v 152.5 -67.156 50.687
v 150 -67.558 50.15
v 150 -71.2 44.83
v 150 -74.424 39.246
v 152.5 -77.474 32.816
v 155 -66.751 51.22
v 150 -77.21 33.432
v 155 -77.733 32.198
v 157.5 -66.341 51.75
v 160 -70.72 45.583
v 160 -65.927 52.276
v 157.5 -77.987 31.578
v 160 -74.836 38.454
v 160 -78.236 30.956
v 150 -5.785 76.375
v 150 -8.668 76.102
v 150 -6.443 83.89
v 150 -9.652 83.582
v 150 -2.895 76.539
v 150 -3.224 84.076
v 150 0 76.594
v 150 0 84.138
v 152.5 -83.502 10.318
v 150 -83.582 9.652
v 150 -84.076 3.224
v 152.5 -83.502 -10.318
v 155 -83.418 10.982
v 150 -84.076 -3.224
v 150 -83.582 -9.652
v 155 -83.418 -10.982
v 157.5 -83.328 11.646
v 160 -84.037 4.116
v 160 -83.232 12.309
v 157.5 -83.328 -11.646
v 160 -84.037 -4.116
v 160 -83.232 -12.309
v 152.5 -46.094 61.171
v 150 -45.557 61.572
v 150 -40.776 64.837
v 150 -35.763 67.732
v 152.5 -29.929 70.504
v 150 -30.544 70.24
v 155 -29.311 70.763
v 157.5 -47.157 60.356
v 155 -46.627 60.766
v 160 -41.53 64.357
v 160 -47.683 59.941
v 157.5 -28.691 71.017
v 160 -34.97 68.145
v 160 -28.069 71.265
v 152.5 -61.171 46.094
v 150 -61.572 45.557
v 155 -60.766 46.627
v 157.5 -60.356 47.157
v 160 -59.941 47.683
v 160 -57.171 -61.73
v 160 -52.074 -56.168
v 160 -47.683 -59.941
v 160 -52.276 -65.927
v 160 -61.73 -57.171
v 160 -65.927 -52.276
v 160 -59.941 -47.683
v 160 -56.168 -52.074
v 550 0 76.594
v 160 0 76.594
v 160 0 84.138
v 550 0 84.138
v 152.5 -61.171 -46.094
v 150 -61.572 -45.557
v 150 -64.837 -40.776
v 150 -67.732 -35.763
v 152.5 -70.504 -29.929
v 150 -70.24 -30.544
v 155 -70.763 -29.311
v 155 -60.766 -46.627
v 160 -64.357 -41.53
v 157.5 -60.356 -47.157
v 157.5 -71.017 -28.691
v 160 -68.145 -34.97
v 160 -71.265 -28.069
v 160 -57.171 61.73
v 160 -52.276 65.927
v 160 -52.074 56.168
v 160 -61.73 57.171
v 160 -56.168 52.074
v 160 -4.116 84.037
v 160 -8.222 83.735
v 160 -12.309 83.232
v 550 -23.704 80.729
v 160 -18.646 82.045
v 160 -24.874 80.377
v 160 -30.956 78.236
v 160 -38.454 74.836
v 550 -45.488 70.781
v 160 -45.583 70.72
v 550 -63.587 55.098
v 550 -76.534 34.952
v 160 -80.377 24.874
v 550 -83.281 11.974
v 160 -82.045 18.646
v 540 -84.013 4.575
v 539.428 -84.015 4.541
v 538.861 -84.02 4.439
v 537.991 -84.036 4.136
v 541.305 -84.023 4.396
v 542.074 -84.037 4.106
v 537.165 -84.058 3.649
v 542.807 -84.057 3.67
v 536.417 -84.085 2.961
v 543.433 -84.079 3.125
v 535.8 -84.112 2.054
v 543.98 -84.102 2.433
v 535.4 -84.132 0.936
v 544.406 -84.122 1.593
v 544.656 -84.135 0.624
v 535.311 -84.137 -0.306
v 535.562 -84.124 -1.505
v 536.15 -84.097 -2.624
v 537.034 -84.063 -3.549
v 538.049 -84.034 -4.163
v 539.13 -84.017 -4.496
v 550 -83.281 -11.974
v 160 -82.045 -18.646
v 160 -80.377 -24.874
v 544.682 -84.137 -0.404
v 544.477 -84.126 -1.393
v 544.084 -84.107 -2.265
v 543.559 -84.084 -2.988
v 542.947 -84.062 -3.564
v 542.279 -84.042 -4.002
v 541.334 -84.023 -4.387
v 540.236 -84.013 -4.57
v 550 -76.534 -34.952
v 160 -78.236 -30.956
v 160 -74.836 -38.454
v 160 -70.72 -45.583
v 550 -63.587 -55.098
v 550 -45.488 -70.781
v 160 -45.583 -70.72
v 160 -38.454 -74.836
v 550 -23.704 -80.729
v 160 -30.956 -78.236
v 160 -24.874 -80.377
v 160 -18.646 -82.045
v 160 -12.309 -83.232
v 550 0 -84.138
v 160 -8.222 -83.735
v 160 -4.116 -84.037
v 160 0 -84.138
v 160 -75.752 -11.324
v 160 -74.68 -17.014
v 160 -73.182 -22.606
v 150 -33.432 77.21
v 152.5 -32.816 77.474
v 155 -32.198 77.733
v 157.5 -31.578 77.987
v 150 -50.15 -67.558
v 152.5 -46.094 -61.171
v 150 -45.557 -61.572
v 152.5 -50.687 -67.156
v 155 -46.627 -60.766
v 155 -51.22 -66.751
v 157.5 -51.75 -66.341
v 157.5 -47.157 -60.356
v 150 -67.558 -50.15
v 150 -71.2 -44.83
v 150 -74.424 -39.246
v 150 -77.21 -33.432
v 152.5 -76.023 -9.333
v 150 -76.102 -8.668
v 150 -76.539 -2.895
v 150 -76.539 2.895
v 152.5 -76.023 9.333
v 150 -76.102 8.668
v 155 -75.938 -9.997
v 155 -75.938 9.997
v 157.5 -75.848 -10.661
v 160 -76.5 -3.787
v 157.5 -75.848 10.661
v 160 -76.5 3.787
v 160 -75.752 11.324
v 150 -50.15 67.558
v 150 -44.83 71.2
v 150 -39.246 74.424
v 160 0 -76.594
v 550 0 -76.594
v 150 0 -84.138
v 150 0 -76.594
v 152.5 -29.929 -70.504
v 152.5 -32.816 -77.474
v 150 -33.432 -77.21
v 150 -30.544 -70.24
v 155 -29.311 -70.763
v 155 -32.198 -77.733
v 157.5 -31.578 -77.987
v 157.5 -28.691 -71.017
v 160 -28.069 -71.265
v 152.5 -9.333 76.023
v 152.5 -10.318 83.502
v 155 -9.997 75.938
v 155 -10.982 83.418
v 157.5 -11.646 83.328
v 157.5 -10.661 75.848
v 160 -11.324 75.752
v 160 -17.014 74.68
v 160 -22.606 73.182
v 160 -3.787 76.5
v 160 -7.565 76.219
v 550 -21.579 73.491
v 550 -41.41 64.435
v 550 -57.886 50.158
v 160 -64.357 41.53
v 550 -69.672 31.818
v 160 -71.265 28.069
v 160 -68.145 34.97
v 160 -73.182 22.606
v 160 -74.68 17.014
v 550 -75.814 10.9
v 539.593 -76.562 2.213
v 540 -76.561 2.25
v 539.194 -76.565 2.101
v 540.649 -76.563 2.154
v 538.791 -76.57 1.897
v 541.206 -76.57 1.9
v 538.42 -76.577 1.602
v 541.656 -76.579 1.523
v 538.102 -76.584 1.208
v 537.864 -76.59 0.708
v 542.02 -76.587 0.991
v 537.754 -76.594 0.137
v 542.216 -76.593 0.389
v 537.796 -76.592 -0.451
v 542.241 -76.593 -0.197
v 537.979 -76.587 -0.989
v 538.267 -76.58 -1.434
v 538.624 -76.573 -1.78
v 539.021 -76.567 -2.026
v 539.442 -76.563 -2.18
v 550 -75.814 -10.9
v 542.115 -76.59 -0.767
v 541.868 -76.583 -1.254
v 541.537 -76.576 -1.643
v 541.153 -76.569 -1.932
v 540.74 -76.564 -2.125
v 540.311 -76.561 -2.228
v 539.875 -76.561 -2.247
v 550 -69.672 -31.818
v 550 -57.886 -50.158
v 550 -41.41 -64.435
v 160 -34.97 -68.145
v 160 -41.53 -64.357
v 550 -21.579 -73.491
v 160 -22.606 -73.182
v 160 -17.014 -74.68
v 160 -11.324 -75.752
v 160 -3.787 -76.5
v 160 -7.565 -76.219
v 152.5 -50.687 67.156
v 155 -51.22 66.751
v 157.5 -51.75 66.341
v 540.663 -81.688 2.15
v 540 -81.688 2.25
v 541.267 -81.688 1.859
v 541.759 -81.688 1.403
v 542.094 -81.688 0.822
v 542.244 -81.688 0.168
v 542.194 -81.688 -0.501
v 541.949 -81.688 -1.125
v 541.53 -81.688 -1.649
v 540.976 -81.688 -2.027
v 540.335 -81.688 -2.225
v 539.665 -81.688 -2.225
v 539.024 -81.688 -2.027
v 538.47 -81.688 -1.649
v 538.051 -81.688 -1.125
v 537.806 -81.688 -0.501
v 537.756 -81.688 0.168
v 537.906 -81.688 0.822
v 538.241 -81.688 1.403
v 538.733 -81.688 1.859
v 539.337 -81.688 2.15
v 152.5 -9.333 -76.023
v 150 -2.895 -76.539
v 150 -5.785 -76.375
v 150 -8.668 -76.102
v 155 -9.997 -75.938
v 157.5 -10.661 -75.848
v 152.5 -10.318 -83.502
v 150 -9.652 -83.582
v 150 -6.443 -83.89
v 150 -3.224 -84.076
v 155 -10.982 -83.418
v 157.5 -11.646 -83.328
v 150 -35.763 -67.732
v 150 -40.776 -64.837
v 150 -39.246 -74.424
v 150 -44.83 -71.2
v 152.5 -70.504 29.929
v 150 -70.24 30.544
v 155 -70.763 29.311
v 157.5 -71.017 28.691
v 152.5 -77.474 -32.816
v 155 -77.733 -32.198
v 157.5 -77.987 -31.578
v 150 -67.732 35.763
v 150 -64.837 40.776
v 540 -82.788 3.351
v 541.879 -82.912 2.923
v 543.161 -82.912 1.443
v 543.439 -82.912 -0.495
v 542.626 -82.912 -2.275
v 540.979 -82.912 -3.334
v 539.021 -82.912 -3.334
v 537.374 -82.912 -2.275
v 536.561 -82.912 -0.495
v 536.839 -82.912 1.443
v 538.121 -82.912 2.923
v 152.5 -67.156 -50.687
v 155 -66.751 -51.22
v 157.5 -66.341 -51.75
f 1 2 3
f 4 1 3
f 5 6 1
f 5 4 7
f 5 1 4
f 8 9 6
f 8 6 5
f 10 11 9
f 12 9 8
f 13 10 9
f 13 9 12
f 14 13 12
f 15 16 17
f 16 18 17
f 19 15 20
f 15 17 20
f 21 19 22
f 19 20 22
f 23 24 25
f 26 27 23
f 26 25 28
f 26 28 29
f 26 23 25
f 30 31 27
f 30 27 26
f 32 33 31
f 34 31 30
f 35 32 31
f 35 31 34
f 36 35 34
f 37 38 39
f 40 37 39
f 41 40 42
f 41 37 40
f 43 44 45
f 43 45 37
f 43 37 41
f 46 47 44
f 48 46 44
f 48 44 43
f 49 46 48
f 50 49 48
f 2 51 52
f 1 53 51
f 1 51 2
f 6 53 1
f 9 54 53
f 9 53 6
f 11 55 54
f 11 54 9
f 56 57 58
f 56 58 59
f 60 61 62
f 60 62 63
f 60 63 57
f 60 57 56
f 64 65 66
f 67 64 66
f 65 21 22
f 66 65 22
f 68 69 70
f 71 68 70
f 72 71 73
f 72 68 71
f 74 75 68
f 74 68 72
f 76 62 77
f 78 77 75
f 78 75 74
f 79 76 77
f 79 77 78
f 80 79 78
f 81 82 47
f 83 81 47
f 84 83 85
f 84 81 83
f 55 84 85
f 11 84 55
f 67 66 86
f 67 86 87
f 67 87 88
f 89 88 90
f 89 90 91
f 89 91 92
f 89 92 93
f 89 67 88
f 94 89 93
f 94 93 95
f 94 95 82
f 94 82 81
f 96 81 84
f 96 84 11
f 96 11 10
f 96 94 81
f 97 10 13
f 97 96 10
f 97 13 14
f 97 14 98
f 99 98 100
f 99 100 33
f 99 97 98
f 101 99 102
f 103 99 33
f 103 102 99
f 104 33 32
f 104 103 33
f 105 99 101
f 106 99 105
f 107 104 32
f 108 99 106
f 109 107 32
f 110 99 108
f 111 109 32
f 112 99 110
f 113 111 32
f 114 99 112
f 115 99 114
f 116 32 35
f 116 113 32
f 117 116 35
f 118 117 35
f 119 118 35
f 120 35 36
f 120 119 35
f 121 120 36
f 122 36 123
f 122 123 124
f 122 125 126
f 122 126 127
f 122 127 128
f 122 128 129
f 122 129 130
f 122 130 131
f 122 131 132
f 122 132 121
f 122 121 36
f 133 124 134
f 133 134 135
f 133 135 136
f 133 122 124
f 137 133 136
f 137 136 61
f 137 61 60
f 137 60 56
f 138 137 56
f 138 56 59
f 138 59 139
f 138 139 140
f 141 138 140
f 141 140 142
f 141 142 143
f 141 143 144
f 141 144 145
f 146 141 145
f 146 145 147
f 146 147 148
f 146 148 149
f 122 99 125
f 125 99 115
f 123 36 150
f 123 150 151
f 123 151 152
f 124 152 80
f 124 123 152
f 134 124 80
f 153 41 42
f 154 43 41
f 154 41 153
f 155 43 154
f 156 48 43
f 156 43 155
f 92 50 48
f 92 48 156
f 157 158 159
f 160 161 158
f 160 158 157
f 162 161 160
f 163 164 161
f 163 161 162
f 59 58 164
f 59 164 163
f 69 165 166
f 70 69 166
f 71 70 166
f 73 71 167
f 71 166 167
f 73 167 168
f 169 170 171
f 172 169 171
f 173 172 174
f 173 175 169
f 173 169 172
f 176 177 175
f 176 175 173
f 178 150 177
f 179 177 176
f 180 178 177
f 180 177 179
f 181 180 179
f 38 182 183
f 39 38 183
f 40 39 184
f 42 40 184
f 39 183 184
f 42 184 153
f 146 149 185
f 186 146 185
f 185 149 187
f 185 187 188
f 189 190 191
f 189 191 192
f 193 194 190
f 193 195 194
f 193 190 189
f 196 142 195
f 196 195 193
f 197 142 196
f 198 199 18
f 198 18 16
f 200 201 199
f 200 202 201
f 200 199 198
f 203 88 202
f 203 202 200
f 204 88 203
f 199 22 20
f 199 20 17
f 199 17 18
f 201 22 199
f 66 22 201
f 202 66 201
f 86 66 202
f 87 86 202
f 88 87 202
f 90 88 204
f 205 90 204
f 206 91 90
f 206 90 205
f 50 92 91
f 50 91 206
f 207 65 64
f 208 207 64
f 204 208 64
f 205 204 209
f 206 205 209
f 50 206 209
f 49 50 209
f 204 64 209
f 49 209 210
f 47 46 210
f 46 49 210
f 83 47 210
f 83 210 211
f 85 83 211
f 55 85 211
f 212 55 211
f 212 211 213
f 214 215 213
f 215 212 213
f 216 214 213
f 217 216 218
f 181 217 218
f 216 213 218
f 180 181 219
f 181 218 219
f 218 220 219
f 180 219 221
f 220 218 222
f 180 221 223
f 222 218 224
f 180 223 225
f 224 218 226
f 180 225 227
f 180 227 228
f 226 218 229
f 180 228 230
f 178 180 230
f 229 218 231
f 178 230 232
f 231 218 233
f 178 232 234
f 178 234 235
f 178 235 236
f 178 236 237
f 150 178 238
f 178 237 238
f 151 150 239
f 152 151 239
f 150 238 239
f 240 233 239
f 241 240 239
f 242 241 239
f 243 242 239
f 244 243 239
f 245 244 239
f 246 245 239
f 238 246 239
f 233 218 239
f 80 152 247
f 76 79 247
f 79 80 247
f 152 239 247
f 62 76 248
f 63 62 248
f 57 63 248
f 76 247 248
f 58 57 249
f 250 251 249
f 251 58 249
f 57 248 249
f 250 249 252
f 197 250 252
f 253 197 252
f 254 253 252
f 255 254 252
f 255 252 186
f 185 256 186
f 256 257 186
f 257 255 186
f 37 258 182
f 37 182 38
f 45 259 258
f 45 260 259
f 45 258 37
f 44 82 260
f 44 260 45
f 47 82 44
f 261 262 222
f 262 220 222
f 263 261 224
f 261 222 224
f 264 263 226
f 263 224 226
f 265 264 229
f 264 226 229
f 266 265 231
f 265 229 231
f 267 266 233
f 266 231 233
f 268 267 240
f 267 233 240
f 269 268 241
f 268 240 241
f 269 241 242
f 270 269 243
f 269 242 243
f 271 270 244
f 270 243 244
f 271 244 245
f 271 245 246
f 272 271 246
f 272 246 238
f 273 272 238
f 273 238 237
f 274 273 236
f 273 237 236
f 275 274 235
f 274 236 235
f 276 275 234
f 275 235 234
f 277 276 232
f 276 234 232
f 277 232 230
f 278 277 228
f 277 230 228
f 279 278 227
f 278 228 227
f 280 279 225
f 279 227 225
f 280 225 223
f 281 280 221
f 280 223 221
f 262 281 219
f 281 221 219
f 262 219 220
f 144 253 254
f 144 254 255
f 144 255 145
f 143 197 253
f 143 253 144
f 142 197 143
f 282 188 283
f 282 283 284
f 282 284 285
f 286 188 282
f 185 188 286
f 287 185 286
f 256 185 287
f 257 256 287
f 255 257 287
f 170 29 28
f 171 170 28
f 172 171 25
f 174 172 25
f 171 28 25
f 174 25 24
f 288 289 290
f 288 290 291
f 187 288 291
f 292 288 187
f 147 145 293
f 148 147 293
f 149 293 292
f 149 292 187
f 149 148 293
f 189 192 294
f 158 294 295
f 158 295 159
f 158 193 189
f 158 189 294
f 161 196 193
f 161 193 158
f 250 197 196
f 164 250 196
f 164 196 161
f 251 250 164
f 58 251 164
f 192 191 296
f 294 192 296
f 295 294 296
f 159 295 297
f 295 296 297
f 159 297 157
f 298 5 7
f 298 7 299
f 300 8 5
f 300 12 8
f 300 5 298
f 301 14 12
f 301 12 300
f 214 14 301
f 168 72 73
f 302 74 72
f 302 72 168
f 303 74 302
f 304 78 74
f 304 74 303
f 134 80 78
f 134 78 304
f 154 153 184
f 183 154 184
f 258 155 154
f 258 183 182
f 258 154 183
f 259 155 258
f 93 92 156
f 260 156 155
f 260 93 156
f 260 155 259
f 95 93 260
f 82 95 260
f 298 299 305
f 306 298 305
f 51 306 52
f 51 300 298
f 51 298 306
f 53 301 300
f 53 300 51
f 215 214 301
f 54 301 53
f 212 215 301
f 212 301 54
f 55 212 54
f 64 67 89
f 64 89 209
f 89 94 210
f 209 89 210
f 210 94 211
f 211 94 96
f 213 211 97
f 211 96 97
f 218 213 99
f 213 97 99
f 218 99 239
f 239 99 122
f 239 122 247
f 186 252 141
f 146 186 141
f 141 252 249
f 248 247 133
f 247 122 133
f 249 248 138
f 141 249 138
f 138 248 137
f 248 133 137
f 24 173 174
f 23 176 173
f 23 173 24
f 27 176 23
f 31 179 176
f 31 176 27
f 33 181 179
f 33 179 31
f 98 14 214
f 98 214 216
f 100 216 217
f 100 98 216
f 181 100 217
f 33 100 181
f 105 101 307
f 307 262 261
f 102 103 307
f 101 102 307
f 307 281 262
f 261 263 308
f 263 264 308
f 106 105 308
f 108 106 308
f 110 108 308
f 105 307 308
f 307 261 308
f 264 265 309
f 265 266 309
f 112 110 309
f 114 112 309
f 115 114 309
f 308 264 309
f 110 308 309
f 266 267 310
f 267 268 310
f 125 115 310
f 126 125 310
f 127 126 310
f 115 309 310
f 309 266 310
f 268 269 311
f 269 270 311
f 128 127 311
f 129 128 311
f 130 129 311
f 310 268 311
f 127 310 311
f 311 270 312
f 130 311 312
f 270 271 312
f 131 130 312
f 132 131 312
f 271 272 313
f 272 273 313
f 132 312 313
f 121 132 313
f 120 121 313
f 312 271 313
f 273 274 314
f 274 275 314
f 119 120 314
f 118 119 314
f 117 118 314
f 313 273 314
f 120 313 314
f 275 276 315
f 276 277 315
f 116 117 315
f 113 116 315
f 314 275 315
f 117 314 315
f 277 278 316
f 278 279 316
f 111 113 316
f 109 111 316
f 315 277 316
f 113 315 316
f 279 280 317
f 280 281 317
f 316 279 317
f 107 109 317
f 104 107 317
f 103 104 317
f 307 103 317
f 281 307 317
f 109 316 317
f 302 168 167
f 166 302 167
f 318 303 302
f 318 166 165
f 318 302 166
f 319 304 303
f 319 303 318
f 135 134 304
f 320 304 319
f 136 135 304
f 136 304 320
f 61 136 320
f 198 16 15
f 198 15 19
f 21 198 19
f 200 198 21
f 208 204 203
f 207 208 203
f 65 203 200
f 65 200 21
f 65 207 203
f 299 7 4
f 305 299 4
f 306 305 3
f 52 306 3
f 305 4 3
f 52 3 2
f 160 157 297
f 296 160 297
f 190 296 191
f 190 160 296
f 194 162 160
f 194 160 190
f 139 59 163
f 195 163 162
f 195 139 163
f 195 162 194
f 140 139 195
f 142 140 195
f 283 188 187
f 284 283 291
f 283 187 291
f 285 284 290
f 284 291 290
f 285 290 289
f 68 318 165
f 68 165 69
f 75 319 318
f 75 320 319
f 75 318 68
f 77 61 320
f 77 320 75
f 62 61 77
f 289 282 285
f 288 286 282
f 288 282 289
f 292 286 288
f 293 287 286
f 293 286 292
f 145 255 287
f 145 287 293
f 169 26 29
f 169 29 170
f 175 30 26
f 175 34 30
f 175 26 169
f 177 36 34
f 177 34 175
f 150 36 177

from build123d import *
from build123d.topology import SkipClean

# Parameters (mm, degrees)
SKETCH1_W                                           = 390
SKETCH1_H                                           = 7.5438
BOSS_EXTRUDE1_DEPTH                                 = 5
DRAFT1_ANGLE                                        = -15
CIRPATTERN1_COUNT                                   = 12
DRAFT1_OF_CIRPATTERN1_2_ANGLE                       = -15
DRAFT1_OF_CIRPATTERN1_3_ANGLE                       = -15
DRAFT1_OF_CIRPATTERN1_4_ANGLE                       = -15
DRAFT1_OF_CIRPATTERN1_5_ANGLE                       = -15
DRAFT1_OF_CIRPATTERN1_6_ANGLE                       = -15
DRAFT1_OF_CIRPATTERN1_7_ANGLE                       = -15
DRAFT1_OF_CIRPATTERN1_8_ANGLE                       = -15
DRAFT1_OF_CIRPATTERN1_9_ANGLE                       = -15
DRAFT1_OF_CIRPATTERN1_10_ANGLE                      = -15
DRAFT1_OF_CIRPATTERN1_11_ANGLE                      = -15
DRAFT1_OF_CIRPATTERN1_12_ANGLE                      = -15
CUT_EXTRUDE1_DEPTH                                  = 563.723944588
CSK_FOR_M4_COUNTERSUNK_FLAT_HEAD_SCREW1_D           = 4.5
CSK_FOR_M4_COUNTERSUNK_FLAT_HEAD_SCREW1_CSINK_D     = 9.4
CSK_FOR_M4_COUNTERSUNK_FLAT_HEAD_SCREW1_CSINK_ANGLE = 90


with BuildPart() as part:
    # Sketch1 → Revolve1 (revolve)
    with BuildSketch(Plane.XY, mode=Mode.PRIVATE) as revolve1_sk:
        with Locations((355, 80.3656)):
            Rectangle(SKETCH1_W, SKETCH1_H)
    revolve(revolve1_sk.sketch.rotate(Axis((0, 0, 0), (1, 0, 0)), 90), axis=Axis((0, 0, 0), (1, 0, 0)))

    # Sketch2 → Boss-Extrude1 (add, symmetric)
    with BuildSketch(Plane(origin=(155, 0, 0), x_dir=(0, 0, -1), z_dir=(1, 0, 0))):
        with BuildLine():
            Line((9.997484009, 75.938430279), (10.982147498, 83.417692024))
            ThreePointArc((10.982147498, 83.417692024), (0, 84.1375), (-10.982147498, 83.417692024))
            Line((-10.982147498, 83.417692024), (-9.997484009, 75.938430279))
            ThreePointArc((-9.997484009, 75.938430279), (0, 76.5937), (9.997484009, 75.938430279))
        make_face()
    boss_extrude1 = extrude(amount=BOSS_EXTRUDE1_DEPTH, both=True)

    # Draft1
    draft1_faces = [part.faces().sort_by_distance(p)[0] for p in [
        (155, 79.678061151, 10.489815753),
        (155, 79.678061151, -10.489815753),
    ]]
    draft(draft1_faces, Plane(origin=(155, 0, 0), x_dir=(0, 0, 1), z_dir=(1, 0, 0)), DRAFT1_ANGLE)

    # CirPattern1: Boss-Extrude1 ×12 about axis
    with SkipClean():  # the faces are left unmerged after this step: merging them gives an invalid solid
        cirpattern1_axis = Axis((0, 0, 0), (1, 0, 0))
        for i in range(1, CIRPATTERN1_COUNT):
            add(boss_extrude1.rotate(cirpattern1_axis, i * 360 / CIRPATTERN1_COUNT))

    # Draft1 of CirPattern1 2
    draft1_of_cirpattern1_2_faces = [part.faces().sort_by_distance(p)[0] for p in [
        (155, 63.758317205, 48.923477499),
        (155, 74.248132958, 30.754583652),
    ]]
    draft(draft1_of_cirpattern1_2_faces, Plane(origin=(155, 0, 0), x_dir=(0, -0.49999999999999994, 0.8660254037844387), z_dir=(1, 0, 0)), DRAFT1_OF_CIRPATTERN1_2_ANGLE)

    # Draft1 of CirPattern1 3
    draft1_of_cirpattern1_3_faces = [part.faces().sort_by_distance(p)[0] for p in [
        (155, 30.754583652, 74.248132958),
        (155, 48.923477499, 63.758317205),
    ]]
    draft(draft1_of_cirpattern1_3_faces, Plane(origin=(155, 0, 0), x_dir=(0, -0.8660254037844386, 0.5000000000000001), z_dir=(1, 0, 0)), DRAFT1_OF_CIRPATTERN1_3_ANGLE)

    # Draft1 of CirPattern1 4
    draft1_of_cirpattern1_4_faces = [part.faces().sort_by_distance(p)[0] for p in [
        (155, -10.489815753, 79.678061151),
        (155, 10.489815753, 79.678061151),
    ]]
    draft(draft1_of_cirpattern1_4_faces, Plane(origin=(155, 0, 0), x_dir=(0, -1, 0), z_dir=(1, 0, 0)), DRAFT1_OF_CIRPATTERN1_4_ANGLE)

    # Draft1 of CirPattern1 5
    draft1_of_cirpattern1_5_faces = [part.faces().sort_by_distance(p)[0] for p in [
        (155, -48.923477499, 63.758317205),
        (155, -30.754583652, 74.248132958),
    ]]
    draft(draft1_of_cirpattern1_5_faces, Plane(origin=(155, 0, 0), x_dir=(0, -0.8660254037844387, -0.4999999999999998), z_dir=(1, 0, 0)), DRAFT1_OF_CIRPATTERN1_5_ANGLE)

    # Draft1 of CirPattern1 6
    draft1_of_cirpattern1_6_faces = [part.faces().sort_by_distance(p)[0] for p in [
        (155, -74.248132958, 30.754583652),
        (155, -63.758317205, 48.923477499),
    ]]
    draft(draft1_of_cirpattern1_6_faces, Plane(origin=(155, 0, 0), x_dir=(0, -0.49999999999999994, -0.8660254037844387), z_dir=(1, 0, 0)), DRAFT1_OF_CIRPATTERN1_6_ANGLE)

    # Draft1 of CirPattern1 7
    draft1_of_cirpattern1_7_faces = [part.faces().sort_by_distance(p)[0] for p in [
        (155, -79.678061151, -10.489815753),
        (155, -79.678061151, 10.489815753),
    ]]
    draft(draft1_of_cirpattern1_7_faces, Plane(origin=(155, 0, 0), x_dir=(0, 0, -1), z_dir=(1, 0, 0)), DRAFT1_OF_CIRPATTERN1_7_ANGLE)

    # Draft1 of CirPattern1 8
    draft1_of_cirpattern1_8_faces = [part.faces().sort_by_distance(p)[0] for p in [
        (155, -63.758317205, -48.923477499),
        (155, -74.248132958, -30.754583652),
    ]]
    draft(draft1_of_cirpattern1_8_faces, Plane(origin=(155, 0, 0), x_dir=(0, 0.5000000000000001, -0.8660254037844386), z_dir=(1, 0, 0)), DRAFT1_OF_CIRPATTERN1_8_ANGLE)

    # Draft1 of CirPattern1 9
    draft1_of_cirpattern1_9_faces = [part.faces().sort_by_distance(p)[0] for p in [
        (155, -30.754583652, -74.248132958),
        (155, -48.923477499, -63.758317205),
    ]]
    draft(draft1_of_cirpattern1_9_faces, Plane(origin=(155, 0, 0), x_dir=(0, 0.8660254037844384, -0.5000000000000004), z_dir=(1, 0, 0)), DRAFT1_OF_CIRPATTERN1_9_ANGLE)

    # Draft1 of CirPattern1 10
    draft1_of_cirpattern1_10_faces = [part.faces().sort_by_distance(p)[0] for p in [
        (155, 10.489815753, -79.678061151),
        (155, -10.489815753, -79.678061151),
    ]]
    draft(draft1_of_cirpattern1_10_faces, Plane.YZ.offset(155), DRAFT1_OF_CIRPATTERN1_10_ANGLE)

    # Draft1 of CirPattern1 11
    draft1_of_cirpattern1_11_faces = [part.faces().sort_by_distance(p)[0] for p in [
        (155, 48.923477499, -63.758317205),
        (155, 30.754583652, -74.248132958),
    ]]
    draft(draft1_of_cirpattern1_11_faces, Plane(origin=(155, 0, 0), x_dir=(0, 0.8660254037844386, 0.5000000000000001), z_dir=(1, 0, 0)), DRAFT1_OF_CIRPATTERN1_11_ANGLE)

    # Draft1 of CirPattern1 12
    draft1_of_cirpattern1_12_faces = [part.faces().sort_by_distance(p)[0] for p in [
        (155, 74.248132958, -30.754583652),
        (155, 63.758317205, -48.923477499),
    ]]
    draft(draft1_of_cirpattern1_12_faces, Plane(origin=(155, 0, 0), x_dir=(0, 0.5000000000000004, 0.8660254037844384), z_dir=(1, 0, 0)), DRAFT1_OF_CIRPATTERN1_12_ANGLE)

    # Sketch3 → Cut-Extrude1 (cut, through all)
    with BuildSketch(Plane(origin=(0, 0, 0), x_dir=(0, 0, -1), z_dir=(1, 0, 0))):
        with BuildLine():
            Line((0, 0), (-84.1375, 0))
            ThreePointArc((-84.1375, 0), (0, 84.1375), (84.1375, 0))
            Line((84.1375, 0), (0, 0))
        make_face()
    extrude(amount=CUT_EXTRUDE1_DEPTH, mode=Mode.SUBTRACT)

    # CSK for M4 Countersunk Flat Head Screw1 (through all)
    with Locations(Plane(origin=(540, -84.1375, 0), x_dir=(0, 0, -1), z_dir=(0, -1, 0))):
        with Locations((0, 0)):
            CounterSinkHole(CSK_FOR_M4_COUNTERSUNK_FLAT_HEAD_SCREW1_D / 2, CSK_FOR_M4_COUNTERSUNK_FLAT_HEAD_SCREW1_CSINK_D / 2, counter_sink_angle=CSK_FOR_M4_COUNTERSUNK_FLAT_HEAD_SCREW1_CSINK_ANGLE)


solid = part.part
